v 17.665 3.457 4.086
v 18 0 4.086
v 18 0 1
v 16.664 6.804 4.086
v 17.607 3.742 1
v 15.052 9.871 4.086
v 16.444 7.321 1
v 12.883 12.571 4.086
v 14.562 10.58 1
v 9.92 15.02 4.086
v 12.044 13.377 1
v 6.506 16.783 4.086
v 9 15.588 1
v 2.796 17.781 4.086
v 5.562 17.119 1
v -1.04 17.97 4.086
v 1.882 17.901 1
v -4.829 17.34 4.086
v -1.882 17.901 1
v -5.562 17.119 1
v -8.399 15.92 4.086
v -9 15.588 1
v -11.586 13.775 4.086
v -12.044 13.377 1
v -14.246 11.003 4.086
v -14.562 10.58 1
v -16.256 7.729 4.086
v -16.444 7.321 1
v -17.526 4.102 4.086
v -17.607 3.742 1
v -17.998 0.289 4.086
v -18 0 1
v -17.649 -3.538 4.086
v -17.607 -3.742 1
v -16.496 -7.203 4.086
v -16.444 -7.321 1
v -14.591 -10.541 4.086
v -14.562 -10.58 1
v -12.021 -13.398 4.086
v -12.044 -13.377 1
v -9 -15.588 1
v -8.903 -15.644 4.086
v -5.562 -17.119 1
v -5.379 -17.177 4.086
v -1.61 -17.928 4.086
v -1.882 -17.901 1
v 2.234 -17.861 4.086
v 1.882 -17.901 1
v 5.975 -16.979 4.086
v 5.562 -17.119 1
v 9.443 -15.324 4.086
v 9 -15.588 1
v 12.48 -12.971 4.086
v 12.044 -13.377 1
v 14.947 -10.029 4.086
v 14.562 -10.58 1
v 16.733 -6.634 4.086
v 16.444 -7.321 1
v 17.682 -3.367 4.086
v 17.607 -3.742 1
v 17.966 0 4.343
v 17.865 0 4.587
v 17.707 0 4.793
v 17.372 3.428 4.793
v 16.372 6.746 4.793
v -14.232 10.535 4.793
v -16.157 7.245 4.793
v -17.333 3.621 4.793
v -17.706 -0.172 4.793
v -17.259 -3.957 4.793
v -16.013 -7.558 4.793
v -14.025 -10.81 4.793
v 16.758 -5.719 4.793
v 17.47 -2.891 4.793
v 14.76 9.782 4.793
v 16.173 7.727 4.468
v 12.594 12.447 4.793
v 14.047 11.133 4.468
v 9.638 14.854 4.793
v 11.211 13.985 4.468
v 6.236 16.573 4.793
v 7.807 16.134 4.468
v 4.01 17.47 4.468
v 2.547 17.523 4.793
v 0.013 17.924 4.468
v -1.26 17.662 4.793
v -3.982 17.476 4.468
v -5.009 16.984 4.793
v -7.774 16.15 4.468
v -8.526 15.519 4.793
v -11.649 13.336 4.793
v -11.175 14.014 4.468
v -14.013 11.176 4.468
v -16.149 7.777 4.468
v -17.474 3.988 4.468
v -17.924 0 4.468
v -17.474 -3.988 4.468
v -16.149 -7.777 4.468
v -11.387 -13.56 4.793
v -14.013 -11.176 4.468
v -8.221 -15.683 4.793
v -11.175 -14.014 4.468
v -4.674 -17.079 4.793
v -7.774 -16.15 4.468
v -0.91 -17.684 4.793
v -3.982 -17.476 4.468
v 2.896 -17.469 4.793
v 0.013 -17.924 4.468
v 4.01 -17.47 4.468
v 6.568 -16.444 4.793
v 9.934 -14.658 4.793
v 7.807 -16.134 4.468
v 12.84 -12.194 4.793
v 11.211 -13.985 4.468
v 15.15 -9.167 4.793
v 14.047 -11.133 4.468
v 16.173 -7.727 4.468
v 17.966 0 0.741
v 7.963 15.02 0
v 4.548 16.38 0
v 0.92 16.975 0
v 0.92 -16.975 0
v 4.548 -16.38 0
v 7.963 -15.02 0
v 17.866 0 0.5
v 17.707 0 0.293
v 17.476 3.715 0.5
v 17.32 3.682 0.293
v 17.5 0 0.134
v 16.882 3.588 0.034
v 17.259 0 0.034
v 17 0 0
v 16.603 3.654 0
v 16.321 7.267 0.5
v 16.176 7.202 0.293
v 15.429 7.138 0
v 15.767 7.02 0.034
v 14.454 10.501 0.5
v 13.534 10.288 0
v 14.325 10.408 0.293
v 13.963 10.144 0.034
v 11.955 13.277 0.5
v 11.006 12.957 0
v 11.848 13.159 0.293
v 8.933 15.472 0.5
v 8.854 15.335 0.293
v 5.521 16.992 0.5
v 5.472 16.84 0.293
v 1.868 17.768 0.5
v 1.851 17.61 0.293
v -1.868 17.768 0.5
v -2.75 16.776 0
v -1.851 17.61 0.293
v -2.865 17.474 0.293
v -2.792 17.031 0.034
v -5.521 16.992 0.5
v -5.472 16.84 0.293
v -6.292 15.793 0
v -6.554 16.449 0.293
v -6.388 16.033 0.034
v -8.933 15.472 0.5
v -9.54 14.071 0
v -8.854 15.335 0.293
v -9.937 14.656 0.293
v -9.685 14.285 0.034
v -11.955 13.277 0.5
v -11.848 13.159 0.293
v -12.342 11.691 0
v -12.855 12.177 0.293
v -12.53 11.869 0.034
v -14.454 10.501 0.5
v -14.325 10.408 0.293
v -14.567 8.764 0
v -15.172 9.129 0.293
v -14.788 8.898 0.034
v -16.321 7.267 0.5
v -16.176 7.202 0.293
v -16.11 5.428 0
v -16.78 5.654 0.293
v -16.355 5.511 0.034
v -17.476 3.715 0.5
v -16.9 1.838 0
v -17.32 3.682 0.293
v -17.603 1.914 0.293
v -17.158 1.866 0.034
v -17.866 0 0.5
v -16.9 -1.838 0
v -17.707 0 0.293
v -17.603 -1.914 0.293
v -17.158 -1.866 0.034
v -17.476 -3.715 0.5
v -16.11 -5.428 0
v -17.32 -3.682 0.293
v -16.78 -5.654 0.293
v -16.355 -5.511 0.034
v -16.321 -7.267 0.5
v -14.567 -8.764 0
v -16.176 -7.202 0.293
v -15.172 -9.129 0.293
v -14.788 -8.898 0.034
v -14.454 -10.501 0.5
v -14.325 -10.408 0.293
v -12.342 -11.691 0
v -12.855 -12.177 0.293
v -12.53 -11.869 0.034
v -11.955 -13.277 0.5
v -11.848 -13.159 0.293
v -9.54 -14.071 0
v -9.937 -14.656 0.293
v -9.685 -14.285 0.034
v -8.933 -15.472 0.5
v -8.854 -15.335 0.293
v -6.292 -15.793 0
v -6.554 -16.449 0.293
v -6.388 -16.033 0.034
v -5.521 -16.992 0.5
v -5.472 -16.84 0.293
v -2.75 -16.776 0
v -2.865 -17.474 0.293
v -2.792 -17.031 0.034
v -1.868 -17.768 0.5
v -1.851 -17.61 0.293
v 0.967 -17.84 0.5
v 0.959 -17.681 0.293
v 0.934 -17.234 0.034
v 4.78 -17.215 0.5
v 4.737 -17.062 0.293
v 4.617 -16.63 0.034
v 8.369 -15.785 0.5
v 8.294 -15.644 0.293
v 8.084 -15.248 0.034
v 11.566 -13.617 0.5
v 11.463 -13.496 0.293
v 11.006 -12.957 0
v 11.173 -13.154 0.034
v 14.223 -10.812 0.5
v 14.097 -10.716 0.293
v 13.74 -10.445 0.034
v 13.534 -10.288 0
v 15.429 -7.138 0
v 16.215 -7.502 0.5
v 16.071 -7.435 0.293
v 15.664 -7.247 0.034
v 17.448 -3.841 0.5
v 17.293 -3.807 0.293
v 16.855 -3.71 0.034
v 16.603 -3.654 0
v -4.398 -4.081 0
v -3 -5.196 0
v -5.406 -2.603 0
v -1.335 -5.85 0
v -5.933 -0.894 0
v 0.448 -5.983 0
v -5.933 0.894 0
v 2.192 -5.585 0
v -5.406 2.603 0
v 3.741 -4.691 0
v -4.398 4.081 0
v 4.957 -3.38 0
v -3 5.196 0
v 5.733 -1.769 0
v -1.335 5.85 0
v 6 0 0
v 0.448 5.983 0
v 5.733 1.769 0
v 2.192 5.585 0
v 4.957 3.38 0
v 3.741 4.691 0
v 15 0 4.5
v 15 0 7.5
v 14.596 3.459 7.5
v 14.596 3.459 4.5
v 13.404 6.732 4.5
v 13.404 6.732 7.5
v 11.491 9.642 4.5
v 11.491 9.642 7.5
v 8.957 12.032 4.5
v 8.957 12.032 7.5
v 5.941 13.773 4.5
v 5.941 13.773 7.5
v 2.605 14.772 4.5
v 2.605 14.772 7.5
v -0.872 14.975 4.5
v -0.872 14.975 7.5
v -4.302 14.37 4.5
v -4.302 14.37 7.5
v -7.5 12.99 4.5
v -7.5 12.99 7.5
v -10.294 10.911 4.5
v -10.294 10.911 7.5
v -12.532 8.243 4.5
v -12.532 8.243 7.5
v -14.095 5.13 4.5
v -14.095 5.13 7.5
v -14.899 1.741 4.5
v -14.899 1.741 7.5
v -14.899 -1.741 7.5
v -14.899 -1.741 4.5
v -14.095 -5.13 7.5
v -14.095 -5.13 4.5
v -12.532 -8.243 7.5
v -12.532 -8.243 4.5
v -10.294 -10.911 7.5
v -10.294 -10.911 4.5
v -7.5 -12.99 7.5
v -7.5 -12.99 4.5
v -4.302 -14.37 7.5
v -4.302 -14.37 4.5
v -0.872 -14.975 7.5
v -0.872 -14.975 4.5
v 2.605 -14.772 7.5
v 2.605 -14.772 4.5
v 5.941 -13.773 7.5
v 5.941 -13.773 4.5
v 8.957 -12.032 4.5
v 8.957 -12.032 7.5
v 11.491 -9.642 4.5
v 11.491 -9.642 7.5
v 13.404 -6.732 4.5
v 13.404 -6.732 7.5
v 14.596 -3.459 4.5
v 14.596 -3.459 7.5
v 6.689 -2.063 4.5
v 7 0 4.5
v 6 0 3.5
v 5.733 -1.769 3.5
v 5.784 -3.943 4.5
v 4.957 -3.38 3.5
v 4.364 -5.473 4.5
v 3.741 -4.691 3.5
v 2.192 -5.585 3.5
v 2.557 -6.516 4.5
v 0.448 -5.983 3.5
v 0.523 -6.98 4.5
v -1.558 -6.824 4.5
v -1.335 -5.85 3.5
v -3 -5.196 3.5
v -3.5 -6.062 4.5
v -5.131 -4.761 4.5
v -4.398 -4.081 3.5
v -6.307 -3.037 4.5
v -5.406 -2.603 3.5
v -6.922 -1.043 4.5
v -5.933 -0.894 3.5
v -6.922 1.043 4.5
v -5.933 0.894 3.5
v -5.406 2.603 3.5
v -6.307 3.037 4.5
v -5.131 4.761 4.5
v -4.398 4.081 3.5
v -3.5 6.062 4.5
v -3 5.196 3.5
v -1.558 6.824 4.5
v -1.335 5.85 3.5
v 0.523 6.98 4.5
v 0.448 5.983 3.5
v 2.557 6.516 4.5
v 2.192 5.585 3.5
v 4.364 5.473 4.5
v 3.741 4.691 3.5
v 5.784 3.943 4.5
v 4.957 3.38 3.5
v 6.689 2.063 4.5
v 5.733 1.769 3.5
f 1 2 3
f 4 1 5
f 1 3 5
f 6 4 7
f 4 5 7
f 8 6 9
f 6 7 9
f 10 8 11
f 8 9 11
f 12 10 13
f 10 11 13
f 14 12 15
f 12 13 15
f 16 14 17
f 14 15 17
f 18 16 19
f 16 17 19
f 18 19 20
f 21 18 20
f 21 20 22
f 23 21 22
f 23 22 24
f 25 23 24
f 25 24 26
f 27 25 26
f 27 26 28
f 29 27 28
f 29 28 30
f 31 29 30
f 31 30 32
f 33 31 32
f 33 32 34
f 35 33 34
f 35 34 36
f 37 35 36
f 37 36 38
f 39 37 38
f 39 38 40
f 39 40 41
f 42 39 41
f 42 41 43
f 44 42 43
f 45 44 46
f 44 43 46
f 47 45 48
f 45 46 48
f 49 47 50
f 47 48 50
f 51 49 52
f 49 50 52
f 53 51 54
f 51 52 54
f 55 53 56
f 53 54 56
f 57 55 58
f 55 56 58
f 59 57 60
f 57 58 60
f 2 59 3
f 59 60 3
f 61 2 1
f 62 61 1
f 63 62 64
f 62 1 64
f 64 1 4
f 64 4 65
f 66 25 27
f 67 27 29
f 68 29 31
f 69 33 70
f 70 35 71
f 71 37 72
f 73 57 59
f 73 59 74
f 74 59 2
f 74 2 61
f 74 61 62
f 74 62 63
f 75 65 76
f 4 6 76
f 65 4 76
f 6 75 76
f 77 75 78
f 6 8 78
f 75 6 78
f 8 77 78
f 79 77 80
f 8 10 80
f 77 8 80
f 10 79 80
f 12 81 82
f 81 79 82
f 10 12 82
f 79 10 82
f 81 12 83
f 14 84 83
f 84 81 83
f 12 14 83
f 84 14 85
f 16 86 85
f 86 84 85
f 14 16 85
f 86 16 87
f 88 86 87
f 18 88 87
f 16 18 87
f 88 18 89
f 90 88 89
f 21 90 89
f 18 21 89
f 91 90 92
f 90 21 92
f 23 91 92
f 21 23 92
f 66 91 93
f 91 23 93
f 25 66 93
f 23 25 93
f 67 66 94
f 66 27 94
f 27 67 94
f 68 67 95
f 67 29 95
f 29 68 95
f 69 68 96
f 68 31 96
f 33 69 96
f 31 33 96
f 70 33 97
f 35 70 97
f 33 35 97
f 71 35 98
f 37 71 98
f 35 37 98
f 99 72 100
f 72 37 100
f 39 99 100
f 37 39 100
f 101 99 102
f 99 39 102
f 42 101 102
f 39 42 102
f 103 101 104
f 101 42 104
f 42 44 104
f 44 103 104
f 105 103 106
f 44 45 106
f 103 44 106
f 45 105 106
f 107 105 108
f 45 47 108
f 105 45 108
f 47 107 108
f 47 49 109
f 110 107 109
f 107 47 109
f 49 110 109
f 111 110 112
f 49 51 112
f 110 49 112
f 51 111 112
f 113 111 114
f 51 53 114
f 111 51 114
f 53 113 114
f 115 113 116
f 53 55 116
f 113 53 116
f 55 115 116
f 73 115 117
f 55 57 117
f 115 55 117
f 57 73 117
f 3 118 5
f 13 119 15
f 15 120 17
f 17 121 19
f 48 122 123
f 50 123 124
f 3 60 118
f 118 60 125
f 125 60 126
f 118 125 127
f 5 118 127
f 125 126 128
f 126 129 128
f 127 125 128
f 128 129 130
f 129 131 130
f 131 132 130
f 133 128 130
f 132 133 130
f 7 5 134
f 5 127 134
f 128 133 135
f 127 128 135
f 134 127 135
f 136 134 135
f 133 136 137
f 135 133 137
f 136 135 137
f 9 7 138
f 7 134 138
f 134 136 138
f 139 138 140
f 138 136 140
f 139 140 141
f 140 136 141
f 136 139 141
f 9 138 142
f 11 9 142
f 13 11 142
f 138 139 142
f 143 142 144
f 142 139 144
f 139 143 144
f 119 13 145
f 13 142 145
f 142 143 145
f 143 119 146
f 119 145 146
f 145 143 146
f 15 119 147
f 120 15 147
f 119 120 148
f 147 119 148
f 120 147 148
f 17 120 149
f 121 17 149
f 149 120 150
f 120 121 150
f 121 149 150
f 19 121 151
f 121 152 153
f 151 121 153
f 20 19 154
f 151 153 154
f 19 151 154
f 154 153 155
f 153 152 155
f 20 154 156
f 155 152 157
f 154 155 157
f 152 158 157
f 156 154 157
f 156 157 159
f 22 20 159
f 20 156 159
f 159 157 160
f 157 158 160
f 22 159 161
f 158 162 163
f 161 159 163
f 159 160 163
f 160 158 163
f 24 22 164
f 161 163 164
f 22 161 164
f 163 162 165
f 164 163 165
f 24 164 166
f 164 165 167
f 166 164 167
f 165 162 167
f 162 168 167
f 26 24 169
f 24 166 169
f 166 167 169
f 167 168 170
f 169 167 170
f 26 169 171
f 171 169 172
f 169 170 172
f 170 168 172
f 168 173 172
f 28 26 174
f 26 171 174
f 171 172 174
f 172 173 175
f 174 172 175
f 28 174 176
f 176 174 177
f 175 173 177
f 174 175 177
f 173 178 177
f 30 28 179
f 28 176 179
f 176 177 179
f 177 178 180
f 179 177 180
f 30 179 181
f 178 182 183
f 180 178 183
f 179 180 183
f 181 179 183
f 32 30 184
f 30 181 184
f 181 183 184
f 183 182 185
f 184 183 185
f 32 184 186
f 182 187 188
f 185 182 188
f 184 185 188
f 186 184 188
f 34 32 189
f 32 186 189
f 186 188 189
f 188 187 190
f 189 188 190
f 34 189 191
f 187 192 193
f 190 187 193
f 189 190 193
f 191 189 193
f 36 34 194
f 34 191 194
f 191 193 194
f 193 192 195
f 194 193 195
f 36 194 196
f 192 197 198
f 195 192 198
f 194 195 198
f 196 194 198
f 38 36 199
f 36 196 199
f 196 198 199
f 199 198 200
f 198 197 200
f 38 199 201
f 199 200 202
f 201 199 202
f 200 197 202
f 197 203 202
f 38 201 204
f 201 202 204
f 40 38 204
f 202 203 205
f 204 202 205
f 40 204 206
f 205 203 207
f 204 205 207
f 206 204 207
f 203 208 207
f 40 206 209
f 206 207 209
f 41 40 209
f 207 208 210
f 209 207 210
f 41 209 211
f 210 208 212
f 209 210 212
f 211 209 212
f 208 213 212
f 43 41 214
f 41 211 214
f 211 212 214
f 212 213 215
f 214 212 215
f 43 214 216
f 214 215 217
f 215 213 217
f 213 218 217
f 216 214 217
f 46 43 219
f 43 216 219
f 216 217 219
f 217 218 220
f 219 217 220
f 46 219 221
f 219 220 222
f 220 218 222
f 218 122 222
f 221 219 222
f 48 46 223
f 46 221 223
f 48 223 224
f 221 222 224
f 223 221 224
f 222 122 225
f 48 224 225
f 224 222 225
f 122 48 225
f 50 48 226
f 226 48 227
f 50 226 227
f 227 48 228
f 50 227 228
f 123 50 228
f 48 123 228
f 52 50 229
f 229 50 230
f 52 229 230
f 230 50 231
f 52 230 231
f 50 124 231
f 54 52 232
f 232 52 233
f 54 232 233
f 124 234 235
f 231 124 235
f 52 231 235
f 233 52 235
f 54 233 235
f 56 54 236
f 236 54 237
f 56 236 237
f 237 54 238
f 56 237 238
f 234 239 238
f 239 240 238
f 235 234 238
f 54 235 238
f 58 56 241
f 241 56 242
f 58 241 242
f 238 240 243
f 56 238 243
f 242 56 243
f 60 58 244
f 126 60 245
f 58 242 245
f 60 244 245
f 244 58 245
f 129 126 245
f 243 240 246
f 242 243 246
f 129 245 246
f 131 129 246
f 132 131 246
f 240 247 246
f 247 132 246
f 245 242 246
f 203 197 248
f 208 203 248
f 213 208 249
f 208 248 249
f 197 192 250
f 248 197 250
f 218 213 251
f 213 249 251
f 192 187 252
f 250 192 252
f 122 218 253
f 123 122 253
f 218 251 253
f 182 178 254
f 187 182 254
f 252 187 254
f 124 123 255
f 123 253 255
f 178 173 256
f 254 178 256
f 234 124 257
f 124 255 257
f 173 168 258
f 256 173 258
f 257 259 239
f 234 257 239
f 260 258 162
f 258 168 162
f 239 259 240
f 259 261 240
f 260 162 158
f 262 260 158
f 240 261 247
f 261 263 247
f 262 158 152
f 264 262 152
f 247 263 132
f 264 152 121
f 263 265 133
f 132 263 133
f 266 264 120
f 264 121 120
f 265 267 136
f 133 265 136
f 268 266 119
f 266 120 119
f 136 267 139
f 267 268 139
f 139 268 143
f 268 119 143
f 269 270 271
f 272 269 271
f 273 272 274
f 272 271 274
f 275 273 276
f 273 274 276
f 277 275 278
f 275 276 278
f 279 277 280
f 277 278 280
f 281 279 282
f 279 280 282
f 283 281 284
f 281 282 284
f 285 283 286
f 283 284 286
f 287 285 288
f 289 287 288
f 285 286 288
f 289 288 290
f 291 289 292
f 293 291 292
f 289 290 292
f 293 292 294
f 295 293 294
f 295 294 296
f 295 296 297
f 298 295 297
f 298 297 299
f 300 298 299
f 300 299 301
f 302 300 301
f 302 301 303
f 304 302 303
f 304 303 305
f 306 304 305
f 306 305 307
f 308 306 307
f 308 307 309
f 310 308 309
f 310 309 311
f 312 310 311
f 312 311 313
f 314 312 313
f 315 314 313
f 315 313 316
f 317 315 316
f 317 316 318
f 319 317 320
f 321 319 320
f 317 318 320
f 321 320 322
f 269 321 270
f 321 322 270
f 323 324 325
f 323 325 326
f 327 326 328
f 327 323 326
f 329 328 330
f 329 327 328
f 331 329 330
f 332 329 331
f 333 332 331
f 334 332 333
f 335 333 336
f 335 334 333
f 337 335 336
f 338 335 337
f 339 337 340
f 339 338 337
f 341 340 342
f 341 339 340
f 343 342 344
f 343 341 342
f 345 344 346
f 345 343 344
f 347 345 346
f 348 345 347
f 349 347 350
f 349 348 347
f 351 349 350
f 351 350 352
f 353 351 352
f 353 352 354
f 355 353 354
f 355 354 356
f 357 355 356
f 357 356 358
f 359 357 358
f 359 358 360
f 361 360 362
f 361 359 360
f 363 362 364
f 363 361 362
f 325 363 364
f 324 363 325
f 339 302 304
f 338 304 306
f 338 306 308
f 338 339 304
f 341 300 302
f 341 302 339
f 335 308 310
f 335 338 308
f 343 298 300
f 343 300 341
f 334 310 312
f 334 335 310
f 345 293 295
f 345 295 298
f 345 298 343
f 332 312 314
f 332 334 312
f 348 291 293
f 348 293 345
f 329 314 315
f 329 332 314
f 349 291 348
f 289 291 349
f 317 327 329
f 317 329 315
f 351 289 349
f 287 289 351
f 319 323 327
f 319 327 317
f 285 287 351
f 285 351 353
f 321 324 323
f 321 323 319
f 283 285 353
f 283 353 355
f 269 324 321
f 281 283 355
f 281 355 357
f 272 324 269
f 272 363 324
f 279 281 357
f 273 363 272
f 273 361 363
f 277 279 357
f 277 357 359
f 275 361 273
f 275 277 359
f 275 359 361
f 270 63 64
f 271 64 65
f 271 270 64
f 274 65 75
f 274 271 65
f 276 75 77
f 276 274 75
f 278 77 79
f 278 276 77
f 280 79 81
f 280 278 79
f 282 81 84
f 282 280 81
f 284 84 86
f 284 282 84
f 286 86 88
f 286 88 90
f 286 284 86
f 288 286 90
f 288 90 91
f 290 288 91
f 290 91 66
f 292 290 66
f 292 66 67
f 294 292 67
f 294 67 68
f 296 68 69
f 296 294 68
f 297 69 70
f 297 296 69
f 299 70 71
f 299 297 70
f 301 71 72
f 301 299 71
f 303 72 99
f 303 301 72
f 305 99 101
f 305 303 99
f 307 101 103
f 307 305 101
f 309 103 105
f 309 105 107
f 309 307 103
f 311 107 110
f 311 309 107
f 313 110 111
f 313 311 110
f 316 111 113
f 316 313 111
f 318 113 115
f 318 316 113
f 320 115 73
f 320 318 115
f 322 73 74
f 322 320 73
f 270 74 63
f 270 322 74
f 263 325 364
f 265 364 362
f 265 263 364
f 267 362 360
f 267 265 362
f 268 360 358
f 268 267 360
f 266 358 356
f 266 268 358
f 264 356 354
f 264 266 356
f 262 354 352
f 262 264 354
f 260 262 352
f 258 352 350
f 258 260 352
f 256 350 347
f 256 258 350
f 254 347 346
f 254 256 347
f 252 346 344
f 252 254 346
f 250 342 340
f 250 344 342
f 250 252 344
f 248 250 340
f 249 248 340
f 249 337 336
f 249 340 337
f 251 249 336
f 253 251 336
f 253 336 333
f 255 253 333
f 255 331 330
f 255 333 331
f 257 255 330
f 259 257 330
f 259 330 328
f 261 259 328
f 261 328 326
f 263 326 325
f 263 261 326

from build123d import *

# Parameters (mm, degrees)
F0_R     = 18
F1_DEPTH = 9.5
F2_R     = 15
F3_DEPTH = 5
F4_R     = 6
F5_DEPTH = 5
F6_SIZE  = 1
F8_R     = 1
F9_R     = 1


# Not quite as in the source:
# - a fillet or chamfer that OpenCascade refuses, or shapes differently, is made with other operations: its cross-section is extruded or revolved along the edge and cut away or added


with BuildPart() as f1:
    # F0 (on Top) → F1 (new body)
    with BuildSketch(Plane.XY):
        Circle(F0_R)
    extrude(amount=F1_DEPTH)

    # F2 (on face) → F3 (cut)
    with BuildSketch(Plane.XY.offset(9.5)):
        Circle(F2_R)
    extrude(amount=-F3_DEPTH, mode=Mode.SUBTRACT)

    # F4 (on Top) → F5 (cut)
    with BuildSketch(Plane.XY):
        Circle(F4_R)
    extrude(amount=F5_DEPTH, mode=Mode.SUBTRACT)

    # F6
    f6_edges = [f1.edges().sort_by_distance(p)[0] for p in [
        (-6, 0, 4.5),
    ]]
    chamfer(f6_edges, length=F6_SIZE)

    # F7: chamfer of 5 on 1 edges, made by hand

    # F7_s1 → F7_t2 (revolve, cut)
    with BuildSketch(Plane.XZ):
        Polygon((18, 4.5), (13, 9.5), (18, 9.5), align=None)
    revolve(axis=Axis((0, 0, 9.5), (0, 0, 1)), mode=Mode.SUBTRACT)

    # F8
    f8_edges = [f1.edges().sort_by_distance(p)[0] for p in [
        (-18, 0, 4.5),
    ]]
    fillet(f8_edges, radius=F8_R)

    # F9
    f9_edges = [f1.edges().sort_by_distance(p)[0] for p in [
        (-18, 0, 0),
    ]]
    fillet(f9_edges, radius=F9_R)


solid = f1.part
